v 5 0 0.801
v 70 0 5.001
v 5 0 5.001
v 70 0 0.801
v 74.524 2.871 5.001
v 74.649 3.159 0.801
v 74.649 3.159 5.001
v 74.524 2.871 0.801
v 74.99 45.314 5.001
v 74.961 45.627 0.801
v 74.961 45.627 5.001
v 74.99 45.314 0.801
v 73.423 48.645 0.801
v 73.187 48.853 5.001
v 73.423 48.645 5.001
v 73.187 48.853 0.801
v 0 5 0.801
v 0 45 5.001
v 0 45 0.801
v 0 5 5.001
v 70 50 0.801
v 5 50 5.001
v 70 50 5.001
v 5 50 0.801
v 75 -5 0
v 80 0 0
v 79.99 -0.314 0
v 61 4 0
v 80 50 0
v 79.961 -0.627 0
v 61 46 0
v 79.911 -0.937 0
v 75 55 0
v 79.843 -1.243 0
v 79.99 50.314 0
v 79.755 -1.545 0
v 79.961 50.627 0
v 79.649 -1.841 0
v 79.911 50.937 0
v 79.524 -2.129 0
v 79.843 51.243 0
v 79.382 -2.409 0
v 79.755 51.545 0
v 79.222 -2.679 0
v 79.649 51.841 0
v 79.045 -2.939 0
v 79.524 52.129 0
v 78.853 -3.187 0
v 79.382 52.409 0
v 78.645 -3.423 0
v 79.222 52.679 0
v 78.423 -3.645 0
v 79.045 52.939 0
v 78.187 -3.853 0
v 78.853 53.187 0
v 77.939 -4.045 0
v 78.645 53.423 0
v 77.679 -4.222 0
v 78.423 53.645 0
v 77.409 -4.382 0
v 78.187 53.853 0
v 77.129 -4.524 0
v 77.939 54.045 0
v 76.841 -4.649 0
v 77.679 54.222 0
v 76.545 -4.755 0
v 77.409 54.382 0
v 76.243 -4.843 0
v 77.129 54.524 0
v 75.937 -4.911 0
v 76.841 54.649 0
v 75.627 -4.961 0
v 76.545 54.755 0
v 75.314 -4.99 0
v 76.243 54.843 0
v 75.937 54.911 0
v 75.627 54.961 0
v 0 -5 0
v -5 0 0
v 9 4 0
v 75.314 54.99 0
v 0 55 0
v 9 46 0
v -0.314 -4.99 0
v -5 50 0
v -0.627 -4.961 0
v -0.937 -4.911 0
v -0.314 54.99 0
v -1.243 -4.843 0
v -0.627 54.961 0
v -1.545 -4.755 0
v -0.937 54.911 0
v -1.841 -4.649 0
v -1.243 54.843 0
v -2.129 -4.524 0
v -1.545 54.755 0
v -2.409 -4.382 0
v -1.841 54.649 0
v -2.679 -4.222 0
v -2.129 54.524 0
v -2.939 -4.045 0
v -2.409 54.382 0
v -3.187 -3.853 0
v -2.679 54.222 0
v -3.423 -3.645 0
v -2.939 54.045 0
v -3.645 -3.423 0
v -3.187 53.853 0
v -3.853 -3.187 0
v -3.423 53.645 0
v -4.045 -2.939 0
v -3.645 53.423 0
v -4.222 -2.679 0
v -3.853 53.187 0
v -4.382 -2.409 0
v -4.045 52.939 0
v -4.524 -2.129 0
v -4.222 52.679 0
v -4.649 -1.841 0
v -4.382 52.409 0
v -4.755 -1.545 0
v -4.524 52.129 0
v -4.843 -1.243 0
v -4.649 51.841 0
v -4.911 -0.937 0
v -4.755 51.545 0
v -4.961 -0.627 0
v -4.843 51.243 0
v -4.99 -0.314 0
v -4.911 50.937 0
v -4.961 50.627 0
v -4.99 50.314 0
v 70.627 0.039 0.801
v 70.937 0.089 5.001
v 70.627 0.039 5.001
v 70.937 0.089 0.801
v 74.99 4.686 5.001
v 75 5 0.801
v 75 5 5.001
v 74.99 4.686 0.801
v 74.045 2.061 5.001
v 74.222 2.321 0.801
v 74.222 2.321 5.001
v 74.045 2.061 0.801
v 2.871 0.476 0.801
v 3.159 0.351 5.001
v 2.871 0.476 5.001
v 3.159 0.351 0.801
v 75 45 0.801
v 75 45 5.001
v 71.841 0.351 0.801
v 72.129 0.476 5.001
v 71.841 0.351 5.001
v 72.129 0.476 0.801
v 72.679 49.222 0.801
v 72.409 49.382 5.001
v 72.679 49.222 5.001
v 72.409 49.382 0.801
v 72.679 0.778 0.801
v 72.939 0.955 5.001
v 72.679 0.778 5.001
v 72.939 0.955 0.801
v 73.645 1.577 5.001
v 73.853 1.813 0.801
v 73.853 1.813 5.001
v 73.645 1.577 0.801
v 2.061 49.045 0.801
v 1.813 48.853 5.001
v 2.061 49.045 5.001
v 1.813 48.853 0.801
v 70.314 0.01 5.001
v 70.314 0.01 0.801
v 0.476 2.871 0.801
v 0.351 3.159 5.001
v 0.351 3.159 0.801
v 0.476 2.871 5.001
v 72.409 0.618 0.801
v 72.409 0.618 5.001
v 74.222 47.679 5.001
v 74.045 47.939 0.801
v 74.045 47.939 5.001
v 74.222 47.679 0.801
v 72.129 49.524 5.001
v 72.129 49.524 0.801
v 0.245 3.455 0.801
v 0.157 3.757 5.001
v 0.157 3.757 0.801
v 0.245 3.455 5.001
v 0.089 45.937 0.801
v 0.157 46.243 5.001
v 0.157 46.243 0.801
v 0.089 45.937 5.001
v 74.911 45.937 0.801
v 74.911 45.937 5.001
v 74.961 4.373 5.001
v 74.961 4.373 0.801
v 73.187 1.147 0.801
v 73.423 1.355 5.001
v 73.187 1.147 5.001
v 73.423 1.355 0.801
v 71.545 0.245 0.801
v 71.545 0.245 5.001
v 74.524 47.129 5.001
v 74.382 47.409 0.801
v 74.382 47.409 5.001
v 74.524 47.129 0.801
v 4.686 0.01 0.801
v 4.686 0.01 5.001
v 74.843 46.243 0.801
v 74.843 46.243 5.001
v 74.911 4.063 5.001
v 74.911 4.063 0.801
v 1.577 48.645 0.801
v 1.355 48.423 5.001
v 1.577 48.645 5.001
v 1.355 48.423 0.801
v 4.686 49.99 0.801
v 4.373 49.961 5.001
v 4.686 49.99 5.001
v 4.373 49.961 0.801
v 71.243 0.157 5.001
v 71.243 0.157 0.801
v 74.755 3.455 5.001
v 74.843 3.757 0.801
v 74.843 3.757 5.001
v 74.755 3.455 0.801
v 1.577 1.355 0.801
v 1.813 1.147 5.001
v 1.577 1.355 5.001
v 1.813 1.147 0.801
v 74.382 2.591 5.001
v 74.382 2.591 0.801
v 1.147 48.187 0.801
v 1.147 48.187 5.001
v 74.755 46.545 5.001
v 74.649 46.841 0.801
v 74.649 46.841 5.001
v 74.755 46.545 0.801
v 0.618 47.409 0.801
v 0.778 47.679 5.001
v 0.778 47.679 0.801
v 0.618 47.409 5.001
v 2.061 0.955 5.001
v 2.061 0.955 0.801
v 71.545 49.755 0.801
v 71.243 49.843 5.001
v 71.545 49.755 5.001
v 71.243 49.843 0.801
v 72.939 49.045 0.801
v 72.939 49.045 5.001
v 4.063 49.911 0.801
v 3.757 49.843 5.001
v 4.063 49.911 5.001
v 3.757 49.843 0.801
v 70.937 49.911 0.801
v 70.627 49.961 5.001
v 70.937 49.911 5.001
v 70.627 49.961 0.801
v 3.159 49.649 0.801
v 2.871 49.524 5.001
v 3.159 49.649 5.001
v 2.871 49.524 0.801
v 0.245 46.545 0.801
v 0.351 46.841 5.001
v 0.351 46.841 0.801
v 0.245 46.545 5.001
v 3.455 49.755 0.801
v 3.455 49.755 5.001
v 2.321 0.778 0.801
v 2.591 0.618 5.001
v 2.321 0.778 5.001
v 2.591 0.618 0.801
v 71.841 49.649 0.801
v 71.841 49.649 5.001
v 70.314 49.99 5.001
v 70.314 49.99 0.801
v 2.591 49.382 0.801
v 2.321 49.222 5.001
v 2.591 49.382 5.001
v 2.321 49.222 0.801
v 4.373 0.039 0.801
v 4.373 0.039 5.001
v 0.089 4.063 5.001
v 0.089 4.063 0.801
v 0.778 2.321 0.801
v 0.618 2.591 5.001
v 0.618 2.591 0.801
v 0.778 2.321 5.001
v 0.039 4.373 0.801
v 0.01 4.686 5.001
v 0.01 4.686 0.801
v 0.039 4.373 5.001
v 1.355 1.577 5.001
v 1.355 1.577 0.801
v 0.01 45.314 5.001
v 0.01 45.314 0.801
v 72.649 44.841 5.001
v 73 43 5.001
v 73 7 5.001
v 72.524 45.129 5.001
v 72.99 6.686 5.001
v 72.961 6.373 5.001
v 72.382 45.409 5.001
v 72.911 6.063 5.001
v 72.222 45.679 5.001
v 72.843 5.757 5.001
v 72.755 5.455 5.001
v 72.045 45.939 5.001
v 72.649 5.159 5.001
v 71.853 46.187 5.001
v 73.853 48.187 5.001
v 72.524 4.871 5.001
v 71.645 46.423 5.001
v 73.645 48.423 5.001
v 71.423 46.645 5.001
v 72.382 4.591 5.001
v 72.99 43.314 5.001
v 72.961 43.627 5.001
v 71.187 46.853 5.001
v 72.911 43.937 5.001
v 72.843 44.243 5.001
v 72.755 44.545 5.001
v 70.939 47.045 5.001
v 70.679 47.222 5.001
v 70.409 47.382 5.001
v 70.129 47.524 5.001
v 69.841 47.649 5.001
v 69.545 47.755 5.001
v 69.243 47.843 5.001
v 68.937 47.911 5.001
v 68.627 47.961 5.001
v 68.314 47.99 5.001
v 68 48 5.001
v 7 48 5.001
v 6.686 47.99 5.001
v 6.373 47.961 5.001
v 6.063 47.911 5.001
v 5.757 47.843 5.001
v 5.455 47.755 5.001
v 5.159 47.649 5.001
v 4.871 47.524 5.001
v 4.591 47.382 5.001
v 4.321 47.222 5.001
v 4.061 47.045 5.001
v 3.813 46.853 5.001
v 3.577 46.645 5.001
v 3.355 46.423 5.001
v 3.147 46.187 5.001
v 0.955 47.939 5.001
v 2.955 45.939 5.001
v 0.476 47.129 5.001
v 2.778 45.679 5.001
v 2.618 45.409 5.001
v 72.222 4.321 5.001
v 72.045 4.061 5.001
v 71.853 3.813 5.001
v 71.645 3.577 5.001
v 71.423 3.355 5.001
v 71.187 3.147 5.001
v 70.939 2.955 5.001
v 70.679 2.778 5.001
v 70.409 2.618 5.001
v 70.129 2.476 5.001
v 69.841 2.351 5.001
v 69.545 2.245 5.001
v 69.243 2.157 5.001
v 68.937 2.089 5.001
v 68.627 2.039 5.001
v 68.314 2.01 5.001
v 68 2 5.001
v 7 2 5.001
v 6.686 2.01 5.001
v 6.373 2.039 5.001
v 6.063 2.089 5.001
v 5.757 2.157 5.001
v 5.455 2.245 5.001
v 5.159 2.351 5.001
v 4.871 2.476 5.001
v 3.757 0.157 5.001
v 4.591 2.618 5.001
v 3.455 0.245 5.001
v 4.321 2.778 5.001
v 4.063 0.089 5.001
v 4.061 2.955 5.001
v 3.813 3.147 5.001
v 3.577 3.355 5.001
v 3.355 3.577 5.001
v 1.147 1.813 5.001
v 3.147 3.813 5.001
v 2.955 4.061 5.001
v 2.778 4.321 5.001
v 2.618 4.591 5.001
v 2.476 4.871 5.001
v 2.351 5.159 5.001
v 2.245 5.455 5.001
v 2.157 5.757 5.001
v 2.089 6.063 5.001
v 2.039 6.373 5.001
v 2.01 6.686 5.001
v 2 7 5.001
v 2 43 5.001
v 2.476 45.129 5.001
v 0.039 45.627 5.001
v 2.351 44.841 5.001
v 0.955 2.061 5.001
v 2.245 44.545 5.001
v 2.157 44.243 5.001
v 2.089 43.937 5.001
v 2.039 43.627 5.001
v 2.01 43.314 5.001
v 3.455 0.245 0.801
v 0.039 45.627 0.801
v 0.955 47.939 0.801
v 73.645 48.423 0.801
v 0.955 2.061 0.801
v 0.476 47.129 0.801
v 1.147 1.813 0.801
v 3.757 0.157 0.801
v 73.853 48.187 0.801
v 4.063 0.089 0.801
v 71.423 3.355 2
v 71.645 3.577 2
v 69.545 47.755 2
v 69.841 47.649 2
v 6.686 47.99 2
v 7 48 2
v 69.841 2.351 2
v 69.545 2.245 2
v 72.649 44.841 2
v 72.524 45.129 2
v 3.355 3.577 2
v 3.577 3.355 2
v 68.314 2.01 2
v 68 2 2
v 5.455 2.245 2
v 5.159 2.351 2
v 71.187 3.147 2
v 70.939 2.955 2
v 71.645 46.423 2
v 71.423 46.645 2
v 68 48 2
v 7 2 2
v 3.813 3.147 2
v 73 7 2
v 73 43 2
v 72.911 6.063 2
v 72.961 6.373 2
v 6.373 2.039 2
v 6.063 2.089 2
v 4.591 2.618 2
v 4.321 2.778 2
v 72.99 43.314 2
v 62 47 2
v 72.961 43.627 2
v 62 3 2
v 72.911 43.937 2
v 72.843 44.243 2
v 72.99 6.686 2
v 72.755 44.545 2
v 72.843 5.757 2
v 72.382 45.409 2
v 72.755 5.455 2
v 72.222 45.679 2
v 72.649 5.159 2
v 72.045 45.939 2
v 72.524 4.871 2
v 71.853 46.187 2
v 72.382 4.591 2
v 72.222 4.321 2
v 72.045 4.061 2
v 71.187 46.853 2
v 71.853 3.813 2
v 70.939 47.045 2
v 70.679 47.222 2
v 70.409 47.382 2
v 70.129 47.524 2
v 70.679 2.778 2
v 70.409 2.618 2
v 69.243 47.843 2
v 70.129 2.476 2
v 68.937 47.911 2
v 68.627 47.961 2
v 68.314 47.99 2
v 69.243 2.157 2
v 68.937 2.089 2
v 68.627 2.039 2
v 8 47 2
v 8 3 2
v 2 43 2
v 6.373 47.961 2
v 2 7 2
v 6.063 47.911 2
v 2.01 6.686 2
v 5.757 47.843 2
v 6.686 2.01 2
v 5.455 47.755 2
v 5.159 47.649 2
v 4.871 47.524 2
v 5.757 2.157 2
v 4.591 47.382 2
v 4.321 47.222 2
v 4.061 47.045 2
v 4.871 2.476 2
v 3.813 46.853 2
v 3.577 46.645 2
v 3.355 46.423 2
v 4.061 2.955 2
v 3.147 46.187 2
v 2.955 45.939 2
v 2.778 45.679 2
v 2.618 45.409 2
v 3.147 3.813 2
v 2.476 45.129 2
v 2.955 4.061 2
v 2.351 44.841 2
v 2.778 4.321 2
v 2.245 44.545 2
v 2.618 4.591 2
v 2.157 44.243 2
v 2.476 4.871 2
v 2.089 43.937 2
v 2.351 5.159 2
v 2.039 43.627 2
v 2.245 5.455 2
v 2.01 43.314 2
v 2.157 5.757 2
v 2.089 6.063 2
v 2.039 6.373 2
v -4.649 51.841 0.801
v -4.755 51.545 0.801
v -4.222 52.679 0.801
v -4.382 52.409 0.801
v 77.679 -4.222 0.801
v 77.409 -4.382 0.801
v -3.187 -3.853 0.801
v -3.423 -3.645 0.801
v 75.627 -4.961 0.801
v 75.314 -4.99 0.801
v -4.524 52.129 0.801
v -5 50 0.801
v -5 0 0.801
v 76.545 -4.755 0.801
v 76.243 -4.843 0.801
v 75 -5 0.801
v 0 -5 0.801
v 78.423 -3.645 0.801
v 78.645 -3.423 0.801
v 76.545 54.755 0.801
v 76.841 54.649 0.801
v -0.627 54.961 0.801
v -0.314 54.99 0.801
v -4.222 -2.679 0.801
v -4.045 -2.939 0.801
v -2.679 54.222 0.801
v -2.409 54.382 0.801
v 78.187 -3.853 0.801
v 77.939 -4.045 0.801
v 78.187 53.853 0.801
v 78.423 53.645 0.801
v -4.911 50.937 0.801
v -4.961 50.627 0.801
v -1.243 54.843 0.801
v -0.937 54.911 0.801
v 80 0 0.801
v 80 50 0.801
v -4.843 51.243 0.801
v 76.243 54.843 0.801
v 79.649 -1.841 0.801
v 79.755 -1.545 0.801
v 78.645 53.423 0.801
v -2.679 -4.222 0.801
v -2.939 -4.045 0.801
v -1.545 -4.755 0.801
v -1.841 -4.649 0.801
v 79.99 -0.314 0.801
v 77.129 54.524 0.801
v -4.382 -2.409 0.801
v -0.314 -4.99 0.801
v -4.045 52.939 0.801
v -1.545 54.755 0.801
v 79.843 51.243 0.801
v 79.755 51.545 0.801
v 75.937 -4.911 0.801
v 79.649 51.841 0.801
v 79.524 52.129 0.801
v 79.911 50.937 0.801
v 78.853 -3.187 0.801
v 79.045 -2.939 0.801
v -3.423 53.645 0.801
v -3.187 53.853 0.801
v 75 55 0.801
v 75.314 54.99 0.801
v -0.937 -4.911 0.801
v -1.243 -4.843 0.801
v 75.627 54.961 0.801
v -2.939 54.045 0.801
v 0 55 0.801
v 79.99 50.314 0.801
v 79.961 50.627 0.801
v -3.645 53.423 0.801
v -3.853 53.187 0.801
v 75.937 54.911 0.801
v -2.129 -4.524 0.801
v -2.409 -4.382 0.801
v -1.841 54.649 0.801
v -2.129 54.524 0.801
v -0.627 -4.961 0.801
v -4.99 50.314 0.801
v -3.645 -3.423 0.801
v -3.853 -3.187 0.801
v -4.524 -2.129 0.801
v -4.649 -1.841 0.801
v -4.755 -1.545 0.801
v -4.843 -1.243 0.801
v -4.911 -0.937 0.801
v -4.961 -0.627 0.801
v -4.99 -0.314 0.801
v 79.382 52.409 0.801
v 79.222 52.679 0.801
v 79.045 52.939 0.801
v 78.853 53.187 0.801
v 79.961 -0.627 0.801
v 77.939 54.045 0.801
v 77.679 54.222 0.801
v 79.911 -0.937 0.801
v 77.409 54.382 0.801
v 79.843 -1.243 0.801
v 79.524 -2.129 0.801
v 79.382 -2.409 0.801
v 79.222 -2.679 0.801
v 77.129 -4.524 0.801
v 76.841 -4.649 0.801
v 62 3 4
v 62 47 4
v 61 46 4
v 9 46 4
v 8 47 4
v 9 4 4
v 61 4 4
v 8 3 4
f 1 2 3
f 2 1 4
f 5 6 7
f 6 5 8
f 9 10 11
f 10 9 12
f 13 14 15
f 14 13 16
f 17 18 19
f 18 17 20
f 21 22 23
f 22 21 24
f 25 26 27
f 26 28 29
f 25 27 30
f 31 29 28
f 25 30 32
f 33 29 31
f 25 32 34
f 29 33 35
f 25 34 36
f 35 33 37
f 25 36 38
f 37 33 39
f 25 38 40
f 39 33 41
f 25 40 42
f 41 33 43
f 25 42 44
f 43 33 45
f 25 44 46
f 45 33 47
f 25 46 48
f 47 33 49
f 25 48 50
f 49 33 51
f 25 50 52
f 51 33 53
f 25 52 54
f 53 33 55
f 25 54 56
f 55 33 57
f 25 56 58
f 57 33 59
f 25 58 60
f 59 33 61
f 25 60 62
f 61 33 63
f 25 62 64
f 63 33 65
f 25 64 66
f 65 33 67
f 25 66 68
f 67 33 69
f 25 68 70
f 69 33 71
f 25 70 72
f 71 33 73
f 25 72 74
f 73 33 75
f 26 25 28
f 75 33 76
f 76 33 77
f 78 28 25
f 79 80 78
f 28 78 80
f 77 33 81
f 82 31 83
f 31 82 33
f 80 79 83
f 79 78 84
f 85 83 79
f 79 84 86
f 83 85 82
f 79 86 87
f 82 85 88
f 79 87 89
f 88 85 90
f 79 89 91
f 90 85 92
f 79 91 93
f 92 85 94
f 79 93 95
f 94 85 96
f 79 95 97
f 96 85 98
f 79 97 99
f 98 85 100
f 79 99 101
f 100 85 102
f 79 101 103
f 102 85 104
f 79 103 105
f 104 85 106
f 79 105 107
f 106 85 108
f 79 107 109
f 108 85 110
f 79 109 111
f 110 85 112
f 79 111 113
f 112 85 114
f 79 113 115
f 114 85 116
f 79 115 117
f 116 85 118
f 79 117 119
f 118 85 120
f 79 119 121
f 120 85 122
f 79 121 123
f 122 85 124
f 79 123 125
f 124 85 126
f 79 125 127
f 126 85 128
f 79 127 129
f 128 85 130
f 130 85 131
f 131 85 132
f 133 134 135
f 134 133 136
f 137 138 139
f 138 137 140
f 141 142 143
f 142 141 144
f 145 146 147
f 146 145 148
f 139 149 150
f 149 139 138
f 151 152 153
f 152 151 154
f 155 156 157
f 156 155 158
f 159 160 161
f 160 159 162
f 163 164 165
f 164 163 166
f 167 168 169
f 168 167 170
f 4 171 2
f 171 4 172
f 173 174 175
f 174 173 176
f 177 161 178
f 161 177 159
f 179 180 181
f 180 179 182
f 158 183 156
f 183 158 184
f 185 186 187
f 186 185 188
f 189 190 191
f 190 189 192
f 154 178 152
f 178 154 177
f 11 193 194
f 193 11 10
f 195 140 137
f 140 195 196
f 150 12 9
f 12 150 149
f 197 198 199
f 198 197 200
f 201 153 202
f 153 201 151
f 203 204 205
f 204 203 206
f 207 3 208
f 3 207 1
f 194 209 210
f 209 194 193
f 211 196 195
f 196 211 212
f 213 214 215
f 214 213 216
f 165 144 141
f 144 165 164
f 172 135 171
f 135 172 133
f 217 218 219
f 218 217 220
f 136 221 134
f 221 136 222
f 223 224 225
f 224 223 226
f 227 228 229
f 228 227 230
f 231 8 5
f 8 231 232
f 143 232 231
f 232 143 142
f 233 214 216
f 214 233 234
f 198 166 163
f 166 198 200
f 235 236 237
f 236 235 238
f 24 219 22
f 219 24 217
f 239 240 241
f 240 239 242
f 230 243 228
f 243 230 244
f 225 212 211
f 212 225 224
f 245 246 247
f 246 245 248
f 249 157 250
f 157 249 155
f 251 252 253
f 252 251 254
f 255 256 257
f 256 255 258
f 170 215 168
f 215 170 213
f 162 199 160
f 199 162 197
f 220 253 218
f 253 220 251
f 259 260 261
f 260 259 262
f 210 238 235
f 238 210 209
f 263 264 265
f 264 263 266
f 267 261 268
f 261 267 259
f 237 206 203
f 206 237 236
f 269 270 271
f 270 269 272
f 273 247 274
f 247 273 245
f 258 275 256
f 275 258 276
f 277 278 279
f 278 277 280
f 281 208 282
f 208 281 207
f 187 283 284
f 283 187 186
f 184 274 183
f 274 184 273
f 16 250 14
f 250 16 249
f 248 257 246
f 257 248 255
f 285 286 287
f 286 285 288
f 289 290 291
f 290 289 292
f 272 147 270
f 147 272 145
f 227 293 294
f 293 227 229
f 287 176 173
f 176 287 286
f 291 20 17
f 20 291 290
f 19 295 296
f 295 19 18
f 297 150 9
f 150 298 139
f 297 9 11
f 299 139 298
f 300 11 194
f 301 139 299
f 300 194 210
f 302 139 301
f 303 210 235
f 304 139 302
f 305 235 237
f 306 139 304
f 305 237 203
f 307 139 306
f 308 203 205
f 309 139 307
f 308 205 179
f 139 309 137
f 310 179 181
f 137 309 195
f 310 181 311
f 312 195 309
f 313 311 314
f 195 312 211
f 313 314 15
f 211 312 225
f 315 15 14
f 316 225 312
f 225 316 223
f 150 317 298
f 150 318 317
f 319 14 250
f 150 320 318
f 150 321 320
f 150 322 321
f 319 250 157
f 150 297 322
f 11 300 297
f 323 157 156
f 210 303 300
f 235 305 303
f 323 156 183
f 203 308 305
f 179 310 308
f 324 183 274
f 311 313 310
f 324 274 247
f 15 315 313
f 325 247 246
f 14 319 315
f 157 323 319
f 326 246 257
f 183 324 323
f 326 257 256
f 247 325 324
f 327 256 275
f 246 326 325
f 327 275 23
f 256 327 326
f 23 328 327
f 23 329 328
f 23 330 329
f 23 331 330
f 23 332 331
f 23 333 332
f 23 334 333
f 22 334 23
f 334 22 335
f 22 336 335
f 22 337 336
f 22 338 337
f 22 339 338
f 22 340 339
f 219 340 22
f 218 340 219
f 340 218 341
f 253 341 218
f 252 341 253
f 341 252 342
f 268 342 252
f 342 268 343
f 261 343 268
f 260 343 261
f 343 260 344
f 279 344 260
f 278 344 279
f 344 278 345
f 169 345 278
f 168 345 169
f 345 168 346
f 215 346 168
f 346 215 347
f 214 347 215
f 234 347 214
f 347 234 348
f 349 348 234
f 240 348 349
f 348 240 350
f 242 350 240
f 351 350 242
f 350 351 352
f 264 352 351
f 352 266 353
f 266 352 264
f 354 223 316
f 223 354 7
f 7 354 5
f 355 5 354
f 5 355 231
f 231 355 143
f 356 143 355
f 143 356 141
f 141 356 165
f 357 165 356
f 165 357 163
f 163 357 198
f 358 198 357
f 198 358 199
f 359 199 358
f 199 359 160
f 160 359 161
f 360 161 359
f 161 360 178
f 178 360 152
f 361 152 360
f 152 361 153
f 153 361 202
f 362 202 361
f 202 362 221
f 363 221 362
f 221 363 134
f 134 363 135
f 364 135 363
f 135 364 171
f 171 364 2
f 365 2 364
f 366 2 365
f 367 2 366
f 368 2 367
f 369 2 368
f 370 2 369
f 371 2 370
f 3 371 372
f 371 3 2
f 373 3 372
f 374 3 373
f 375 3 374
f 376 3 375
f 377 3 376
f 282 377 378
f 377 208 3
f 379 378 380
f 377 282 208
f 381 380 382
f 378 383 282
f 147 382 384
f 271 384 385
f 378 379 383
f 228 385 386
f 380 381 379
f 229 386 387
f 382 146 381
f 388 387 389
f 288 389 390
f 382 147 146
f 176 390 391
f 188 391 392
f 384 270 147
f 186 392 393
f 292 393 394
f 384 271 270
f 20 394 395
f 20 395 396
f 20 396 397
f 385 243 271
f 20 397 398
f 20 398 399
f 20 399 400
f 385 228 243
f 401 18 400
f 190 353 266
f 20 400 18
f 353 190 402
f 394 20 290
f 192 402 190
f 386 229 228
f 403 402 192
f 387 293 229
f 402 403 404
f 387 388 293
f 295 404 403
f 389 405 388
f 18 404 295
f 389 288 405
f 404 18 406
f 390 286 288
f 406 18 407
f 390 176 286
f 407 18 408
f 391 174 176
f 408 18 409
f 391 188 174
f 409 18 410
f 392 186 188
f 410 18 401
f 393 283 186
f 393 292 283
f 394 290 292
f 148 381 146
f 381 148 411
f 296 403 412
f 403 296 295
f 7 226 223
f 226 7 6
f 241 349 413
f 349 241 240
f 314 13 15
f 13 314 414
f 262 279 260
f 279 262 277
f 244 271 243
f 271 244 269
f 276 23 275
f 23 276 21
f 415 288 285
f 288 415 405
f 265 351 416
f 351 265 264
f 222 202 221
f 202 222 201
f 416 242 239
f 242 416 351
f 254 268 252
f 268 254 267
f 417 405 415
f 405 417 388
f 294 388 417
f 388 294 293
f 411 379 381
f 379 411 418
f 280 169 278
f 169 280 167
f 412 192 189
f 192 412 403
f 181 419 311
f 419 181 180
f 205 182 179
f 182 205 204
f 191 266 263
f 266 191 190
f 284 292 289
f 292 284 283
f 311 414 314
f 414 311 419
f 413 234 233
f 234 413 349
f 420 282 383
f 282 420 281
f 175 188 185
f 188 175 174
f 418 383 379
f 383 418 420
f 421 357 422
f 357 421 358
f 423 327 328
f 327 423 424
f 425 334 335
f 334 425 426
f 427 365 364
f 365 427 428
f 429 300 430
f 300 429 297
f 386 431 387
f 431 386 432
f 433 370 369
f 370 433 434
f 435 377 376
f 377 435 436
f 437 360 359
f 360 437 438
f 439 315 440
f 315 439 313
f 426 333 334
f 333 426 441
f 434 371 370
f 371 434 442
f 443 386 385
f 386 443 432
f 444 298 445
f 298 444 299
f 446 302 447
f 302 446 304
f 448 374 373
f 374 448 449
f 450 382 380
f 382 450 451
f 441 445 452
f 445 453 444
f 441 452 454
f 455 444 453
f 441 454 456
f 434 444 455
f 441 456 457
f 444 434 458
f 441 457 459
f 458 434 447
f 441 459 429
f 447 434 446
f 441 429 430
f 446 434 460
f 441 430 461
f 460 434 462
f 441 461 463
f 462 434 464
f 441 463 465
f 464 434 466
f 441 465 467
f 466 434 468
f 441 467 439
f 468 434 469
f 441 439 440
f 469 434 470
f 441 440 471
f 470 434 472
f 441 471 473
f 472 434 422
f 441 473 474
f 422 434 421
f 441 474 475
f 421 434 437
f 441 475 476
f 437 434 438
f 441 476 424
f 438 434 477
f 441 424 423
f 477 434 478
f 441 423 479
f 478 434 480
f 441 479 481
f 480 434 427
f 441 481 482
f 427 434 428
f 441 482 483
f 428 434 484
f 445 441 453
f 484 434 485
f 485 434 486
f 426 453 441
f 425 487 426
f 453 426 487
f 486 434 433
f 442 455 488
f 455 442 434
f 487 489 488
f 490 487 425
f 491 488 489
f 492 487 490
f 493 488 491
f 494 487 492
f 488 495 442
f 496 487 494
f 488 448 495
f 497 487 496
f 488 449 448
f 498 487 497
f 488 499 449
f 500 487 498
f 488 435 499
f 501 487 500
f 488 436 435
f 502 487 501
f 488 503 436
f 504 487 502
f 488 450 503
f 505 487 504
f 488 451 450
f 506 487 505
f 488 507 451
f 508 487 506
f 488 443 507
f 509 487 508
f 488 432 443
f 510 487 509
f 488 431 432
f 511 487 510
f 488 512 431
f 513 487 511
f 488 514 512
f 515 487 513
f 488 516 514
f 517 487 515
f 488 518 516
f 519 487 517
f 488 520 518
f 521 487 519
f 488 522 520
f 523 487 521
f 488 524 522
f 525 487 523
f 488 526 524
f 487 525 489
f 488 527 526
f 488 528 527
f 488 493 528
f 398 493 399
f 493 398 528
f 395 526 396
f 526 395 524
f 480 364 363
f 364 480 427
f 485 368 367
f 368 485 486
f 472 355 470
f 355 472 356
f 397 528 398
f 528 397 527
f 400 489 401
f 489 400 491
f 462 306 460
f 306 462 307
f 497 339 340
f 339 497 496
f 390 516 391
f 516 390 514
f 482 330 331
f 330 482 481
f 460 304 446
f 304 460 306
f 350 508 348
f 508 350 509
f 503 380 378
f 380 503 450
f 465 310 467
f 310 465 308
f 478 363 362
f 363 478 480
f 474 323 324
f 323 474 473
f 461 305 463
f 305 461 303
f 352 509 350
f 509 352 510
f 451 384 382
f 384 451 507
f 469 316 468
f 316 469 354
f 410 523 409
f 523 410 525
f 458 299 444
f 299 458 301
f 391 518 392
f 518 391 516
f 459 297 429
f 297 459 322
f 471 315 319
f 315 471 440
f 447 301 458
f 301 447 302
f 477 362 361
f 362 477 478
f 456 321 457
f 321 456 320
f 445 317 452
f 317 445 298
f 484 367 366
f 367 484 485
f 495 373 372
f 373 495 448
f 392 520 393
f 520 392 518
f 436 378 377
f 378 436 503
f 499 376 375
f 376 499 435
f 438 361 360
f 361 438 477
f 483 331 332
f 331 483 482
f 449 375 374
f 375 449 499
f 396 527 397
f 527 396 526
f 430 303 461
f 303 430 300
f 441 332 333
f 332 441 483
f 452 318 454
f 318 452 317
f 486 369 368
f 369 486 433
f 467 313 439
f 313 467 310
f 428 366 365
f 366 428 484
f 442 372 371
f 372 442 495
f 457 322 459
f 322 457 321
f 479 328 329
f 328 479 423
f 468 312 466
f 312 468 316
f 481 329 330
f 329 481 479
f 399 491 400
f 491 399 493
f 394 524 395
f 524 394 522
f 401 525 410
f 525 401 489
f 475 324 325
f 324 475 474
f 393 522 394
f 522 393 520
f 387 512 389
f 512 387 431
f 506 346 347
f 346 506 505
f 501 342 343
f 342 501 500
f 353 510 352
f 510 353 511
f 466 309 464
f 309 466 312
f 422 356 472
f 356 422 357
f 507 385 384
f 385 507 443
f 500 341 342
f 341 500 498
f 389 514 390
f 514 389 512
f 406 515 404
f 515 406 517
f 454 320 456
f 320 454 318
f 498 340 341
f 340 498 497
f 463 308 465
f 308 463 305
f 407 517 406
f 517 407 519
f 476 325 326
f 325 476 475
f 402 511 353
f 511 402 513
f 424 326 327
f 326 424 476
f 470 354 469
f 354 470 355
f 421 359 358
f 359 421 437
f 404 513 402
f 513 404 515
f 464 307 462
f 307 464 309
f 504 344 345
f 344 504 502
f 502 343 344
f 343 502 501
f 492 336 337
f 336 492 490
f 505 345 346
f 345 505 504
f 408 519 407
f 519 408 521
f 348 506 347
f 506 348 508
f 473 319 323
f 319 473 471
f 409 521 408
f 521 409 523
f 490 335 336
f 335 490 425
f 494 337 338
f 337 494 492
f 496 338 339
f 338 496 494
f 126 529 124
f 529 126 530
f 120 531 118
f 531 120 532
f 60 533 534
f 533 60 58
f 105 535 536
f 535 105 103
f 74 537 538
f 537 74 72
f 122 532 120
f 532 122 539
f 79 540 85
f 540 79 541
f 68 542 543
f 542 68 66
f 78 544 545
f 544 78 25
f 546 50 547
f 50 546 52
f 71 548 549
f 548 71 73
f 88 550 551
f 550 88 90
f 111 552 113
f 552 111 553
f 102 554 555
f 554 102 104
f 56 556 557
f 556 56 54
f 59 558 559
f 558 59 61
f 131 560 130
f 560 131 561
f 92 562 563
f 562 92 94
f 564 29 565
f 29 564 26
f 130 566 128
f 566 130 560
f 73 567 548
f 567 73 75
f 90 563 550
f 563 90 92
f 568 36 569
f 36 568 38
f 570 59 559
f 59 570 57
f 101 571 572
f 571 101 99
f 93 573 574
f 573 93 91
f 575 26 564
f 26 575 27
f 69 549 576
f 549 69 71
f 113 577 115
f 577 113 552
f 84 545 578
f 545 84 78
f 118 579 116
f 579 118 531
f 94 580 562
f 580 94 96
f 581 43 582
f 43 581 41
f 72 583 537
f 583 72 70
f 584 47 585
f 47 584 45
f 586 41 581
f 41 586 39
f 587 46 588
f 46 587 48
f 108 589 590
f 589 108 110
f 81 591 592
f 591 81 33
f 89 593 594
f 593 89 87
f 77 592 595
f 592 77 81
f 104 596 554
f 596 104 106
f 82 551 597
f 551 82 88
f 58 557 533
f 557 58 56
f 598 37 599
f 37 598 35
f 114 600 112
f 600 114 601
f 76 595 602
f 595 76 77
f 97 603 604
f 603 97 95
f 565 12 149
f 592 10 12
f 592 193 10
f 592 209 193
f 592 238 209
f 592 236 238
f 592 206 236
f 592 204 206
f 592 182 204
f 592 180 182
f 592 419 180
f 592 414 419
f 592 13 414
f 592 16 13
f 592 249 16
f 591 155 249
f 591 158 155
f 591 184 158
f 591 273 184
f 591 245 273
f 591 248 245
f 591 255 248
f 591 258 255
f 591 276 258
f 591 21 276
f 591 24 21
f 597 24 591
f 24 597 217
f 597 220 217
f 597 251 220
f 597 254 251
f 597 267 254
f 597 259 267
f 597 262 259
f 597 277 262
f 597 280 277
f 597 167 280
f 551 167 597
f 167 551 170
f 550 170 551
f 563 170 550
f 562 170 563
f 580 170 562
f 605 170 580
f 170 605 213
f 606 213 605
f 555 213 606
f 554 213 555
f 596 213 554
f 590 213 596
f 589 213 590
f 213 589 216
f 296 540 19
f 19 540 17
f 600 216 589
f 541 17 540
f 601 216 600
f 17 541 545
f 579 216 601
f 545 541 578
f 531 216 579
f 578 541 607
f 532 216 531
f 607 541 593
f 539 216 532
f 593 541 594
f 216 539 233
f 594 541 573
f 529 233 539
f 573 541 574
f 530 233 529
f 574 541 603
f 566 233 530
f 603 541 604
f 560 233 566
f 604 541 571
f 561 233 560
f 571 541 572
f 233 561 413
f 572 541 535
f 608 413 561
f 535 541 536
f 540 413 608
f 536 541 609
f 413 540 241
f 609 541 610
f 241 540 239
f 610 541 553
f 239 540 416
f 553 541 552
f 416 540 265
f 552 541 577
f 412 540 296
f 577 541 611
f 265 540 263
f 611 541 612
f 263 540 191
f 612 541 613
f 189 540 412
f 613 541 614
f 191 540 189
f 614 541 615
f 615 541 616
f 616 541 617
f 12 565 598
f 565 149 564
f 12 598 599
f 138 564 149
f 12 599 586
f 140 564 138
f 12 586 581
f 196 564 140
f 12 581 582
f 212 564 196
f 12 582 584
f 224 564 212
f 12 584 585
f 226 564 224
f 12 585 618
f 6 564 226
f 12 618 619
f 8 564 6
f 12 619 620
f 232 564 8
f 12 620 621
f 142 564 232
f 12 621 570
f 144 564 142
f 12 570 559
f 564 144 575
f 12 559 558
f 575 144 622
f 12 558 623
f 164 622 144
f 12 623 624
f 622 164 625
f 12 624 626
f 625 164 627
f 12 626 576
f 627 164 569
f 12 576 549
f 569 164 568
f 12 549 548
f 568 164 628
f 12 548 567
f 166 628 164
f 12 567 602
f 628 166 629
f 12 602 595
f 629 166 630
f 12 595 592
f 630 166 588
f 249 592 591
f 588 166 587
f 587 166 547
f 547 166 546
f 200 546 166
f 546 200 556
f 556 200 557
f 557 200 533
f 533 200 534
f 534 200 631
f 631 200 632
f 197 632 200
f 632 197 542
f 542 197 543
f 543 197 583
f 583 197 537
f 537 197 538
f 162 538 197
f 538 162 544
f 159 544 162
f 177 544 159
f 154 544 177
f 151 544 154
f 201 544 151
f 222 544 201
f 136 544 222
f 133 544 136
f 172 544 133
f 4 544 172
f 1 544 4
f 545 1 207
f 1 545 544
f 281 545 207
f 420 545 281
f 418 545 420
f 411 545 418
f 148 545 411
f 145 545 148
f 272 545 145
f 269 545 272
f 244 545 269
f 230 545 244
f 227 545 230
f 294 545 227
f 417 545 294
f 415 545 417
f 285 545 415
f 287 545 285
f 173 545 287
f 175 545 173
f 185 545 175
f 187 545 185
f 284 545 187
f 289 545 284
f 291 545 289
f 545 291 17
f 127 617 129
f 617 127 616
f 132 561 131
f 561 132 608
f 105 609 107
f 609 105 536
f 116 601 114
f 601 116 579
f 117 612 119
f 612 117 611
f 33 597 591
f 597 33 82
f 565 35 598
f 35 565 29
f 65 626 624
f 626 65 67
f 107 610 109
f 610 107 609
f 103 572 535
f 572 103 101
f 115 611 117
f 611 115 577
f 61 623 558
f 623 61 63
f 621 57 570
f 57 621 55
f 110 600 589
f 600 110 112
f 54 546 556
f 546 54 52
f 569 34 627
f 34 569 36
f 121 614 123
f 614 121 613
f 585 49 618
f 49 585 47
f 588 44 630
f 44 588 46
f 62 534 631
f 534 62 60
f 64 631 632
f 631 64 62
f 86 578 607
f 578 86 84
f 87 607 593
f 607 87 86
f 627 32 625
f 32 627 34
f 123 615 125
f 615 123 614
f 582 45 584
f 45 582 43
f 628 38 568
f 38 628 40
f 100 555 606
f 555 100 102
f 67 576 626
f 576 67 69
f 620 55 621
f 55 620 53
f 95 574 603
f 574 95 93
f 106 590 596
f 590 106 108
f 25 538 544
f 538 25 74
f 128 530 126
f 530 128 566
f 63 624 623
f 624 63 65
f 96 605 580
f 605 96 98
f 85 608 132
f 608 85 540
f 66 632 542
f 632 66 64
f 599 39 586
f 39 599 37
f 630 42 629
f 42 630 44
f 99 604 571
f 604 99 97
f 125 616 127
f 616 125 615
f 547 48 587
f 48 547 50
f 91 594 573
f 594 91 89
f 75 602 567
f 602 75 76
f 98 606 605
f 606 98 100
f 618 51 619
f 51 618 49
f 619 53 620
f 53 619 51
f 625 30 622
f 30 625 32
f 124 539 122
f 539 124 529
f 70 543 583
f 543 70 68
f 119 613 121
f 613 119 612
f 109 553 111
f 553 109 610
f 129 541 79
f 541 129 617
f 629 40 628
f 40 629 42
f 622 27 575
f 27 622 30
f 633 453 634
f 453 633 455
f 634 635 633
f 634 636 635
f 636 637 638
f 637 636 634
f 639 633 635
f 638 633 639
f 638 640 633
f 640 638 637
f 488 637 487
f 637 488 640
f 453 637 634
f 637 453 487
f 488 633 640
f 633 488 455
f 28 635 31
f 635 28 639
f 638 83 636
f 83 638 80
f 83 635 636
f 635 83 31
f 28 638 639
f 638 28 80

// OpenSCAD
pared = 2;

placaX = 71;
placaY = 47;

marcoX = 75;
marcoY = 50; 


agujerosX = 65;
agujerosY = 37;

radio = 5;

altoPanel = 30;


module carcasa() {
    rotate([90,60,90]){
        difference() {
            union () {
                minkowski() {
                    rotate_extrude(angle=60, $fn= 100) {
                        square([marcoY, marcoX], center = false);
                    }
                    sphere(radio, $fn= 100);
                }   
                // Panel
                translate([30,0,-radio]) cube([marcoY + radio - 30, altoPanel, marcoX + 2*radio], center = false);
                translate([30,-radio,0]) cube([marcoY + radio - 30, radio, marcoX], center = false);
                rotate([90,0,90]) cylinder(r = radio, h = marcoY + radio, center = false, $fn= 100);
                translate([0,0,+marcoX]) rotate([90,0,90]) cylinder(r = radio, h = marcoY + radio, center = false, $fn= 100);
            }
            rotate_extrude(angle=60, $fn= 100) {
                square([marcoY, marcoX], center = false);
            }
            // Recorte panel
            translate([-2,2,2]) cube([marcoY + radio, altoPanel - 4, marcoX - 4], center = false);
        }
    } 
    
    minkowski() {
        cube([marcoX, marcoY, 10], center = false);
        cylinder(r = radio, $fn= 100);
    }    
}

module caja(){
    agujeros = [
        [(marcoX - agujerosX) / 2, (marcoY - agujerosY) / 2],
        [(marcoX - agujerosX) / 2, (marcoY - agujerosY) / 2 + agujerosY],
        [(marcoX - agujerosX) / 2 + agujerosX, (marcoY - agujerosY) / 2],
        [(marcoX - agujerosX) / 2 + agujerosX, (marcoY - agujerosY) / 2 + agujerosY]
    ];
    difference(){
        union() {
            difference() {
                carcasa();
                // Recortamos el hueco del marco
                cube([marcoX, marcoY, 20], center = false);
            }            
            translate([-0.5,0.5,-2 + 0.001]) cube([marcoX + 1, marcoY + 1, 2], center = false);
            // Tapon - exterior
            rotate([30,0,0]) translate([marcoX - 10,altoPanel / 2,-marcoY - radio]) cylinder(r = 8, h = 10, center = false, $fn = 100);

            // Roscas - exterior
            for (p = agujeros){
                translate([p[0], p[1], -4]) cylinder(r = 2.25, h = 6, center = false, $fn = 100);      
            }
                                  
        }
        // Recorte del marco
        translate([0,10,-2 ]) cube([marcoX - 10, marcoY - 20, 2 + 0.002], center = false);
        // Tapon - interior
        rotate([30,0,0]) translate([marcoX - 10,altoPanel / 2, -marcoY - radio - 0.001]) cylinder(r = 6, h = 10 + 0.002, center = false, $fn = 100);

        // Roscas - interior 
        for (p = agujeros){
            translate([p[0], p[1], -5]) cylinder(d = 0.8, h = 8, center = false, $fn = 100);        
        }      
        
    }    
}

module tapon_cable(){
    difference(){
        union(){
            cylinder(r = 6, h = 10 + 2, center = false, $fn = 100);
            cylinder(r = 8, h = 2, center = false, $fn = 100);  
            translate([0,0,10 + 2]) cylinder(r1 = 6 + 0.2, r2 = 4 , h = 4, center = false, $fn = 100);               
        }   
        translate([0,0,-0.001]) cylinder(d= 4.2, h = 20, center = false, $fn = 100);
        cube([40,0.2,40], center = true);
    }
}

module tapa() {  
    difference() {
        union() {                 
            translate([radio, radio, 0]) difference() {
                minkowski(){
                    cube([marcoX - 2* radio, marcoY - 2 * radio, 5], center = false); 
                    cylinder(r = radio, h = 0.001, center = false, $fn = 100);
                }
                translate ([2, 2, 2]) minkowski(){
                    cube([marcoX - 2 * radio - 4, marcoY - 2 * radio - 4, 5], center = false); 
                    cylinder(r = radio, h = 0.001, center = false, $fn = 100);
                }
            } 
            minkowski() {
                cube([marcoX, marcoY, 0.8], center = false);
                cylinder(r = radio, h = 0.001, $fn= 100);
            }
            translate([15 - radio - 1 - 1, 10 - radio - 1 - 1, 0]) cube([50 + 2 + 2, 40 + 2 + 2, 4], center = false);
        }
        translate([15 - radio - 1, 10 - radio - 1,-0.1]) cube([50 + 2, 40 + 2, 10], center = false);
    }
}

// caja();
tapa();
